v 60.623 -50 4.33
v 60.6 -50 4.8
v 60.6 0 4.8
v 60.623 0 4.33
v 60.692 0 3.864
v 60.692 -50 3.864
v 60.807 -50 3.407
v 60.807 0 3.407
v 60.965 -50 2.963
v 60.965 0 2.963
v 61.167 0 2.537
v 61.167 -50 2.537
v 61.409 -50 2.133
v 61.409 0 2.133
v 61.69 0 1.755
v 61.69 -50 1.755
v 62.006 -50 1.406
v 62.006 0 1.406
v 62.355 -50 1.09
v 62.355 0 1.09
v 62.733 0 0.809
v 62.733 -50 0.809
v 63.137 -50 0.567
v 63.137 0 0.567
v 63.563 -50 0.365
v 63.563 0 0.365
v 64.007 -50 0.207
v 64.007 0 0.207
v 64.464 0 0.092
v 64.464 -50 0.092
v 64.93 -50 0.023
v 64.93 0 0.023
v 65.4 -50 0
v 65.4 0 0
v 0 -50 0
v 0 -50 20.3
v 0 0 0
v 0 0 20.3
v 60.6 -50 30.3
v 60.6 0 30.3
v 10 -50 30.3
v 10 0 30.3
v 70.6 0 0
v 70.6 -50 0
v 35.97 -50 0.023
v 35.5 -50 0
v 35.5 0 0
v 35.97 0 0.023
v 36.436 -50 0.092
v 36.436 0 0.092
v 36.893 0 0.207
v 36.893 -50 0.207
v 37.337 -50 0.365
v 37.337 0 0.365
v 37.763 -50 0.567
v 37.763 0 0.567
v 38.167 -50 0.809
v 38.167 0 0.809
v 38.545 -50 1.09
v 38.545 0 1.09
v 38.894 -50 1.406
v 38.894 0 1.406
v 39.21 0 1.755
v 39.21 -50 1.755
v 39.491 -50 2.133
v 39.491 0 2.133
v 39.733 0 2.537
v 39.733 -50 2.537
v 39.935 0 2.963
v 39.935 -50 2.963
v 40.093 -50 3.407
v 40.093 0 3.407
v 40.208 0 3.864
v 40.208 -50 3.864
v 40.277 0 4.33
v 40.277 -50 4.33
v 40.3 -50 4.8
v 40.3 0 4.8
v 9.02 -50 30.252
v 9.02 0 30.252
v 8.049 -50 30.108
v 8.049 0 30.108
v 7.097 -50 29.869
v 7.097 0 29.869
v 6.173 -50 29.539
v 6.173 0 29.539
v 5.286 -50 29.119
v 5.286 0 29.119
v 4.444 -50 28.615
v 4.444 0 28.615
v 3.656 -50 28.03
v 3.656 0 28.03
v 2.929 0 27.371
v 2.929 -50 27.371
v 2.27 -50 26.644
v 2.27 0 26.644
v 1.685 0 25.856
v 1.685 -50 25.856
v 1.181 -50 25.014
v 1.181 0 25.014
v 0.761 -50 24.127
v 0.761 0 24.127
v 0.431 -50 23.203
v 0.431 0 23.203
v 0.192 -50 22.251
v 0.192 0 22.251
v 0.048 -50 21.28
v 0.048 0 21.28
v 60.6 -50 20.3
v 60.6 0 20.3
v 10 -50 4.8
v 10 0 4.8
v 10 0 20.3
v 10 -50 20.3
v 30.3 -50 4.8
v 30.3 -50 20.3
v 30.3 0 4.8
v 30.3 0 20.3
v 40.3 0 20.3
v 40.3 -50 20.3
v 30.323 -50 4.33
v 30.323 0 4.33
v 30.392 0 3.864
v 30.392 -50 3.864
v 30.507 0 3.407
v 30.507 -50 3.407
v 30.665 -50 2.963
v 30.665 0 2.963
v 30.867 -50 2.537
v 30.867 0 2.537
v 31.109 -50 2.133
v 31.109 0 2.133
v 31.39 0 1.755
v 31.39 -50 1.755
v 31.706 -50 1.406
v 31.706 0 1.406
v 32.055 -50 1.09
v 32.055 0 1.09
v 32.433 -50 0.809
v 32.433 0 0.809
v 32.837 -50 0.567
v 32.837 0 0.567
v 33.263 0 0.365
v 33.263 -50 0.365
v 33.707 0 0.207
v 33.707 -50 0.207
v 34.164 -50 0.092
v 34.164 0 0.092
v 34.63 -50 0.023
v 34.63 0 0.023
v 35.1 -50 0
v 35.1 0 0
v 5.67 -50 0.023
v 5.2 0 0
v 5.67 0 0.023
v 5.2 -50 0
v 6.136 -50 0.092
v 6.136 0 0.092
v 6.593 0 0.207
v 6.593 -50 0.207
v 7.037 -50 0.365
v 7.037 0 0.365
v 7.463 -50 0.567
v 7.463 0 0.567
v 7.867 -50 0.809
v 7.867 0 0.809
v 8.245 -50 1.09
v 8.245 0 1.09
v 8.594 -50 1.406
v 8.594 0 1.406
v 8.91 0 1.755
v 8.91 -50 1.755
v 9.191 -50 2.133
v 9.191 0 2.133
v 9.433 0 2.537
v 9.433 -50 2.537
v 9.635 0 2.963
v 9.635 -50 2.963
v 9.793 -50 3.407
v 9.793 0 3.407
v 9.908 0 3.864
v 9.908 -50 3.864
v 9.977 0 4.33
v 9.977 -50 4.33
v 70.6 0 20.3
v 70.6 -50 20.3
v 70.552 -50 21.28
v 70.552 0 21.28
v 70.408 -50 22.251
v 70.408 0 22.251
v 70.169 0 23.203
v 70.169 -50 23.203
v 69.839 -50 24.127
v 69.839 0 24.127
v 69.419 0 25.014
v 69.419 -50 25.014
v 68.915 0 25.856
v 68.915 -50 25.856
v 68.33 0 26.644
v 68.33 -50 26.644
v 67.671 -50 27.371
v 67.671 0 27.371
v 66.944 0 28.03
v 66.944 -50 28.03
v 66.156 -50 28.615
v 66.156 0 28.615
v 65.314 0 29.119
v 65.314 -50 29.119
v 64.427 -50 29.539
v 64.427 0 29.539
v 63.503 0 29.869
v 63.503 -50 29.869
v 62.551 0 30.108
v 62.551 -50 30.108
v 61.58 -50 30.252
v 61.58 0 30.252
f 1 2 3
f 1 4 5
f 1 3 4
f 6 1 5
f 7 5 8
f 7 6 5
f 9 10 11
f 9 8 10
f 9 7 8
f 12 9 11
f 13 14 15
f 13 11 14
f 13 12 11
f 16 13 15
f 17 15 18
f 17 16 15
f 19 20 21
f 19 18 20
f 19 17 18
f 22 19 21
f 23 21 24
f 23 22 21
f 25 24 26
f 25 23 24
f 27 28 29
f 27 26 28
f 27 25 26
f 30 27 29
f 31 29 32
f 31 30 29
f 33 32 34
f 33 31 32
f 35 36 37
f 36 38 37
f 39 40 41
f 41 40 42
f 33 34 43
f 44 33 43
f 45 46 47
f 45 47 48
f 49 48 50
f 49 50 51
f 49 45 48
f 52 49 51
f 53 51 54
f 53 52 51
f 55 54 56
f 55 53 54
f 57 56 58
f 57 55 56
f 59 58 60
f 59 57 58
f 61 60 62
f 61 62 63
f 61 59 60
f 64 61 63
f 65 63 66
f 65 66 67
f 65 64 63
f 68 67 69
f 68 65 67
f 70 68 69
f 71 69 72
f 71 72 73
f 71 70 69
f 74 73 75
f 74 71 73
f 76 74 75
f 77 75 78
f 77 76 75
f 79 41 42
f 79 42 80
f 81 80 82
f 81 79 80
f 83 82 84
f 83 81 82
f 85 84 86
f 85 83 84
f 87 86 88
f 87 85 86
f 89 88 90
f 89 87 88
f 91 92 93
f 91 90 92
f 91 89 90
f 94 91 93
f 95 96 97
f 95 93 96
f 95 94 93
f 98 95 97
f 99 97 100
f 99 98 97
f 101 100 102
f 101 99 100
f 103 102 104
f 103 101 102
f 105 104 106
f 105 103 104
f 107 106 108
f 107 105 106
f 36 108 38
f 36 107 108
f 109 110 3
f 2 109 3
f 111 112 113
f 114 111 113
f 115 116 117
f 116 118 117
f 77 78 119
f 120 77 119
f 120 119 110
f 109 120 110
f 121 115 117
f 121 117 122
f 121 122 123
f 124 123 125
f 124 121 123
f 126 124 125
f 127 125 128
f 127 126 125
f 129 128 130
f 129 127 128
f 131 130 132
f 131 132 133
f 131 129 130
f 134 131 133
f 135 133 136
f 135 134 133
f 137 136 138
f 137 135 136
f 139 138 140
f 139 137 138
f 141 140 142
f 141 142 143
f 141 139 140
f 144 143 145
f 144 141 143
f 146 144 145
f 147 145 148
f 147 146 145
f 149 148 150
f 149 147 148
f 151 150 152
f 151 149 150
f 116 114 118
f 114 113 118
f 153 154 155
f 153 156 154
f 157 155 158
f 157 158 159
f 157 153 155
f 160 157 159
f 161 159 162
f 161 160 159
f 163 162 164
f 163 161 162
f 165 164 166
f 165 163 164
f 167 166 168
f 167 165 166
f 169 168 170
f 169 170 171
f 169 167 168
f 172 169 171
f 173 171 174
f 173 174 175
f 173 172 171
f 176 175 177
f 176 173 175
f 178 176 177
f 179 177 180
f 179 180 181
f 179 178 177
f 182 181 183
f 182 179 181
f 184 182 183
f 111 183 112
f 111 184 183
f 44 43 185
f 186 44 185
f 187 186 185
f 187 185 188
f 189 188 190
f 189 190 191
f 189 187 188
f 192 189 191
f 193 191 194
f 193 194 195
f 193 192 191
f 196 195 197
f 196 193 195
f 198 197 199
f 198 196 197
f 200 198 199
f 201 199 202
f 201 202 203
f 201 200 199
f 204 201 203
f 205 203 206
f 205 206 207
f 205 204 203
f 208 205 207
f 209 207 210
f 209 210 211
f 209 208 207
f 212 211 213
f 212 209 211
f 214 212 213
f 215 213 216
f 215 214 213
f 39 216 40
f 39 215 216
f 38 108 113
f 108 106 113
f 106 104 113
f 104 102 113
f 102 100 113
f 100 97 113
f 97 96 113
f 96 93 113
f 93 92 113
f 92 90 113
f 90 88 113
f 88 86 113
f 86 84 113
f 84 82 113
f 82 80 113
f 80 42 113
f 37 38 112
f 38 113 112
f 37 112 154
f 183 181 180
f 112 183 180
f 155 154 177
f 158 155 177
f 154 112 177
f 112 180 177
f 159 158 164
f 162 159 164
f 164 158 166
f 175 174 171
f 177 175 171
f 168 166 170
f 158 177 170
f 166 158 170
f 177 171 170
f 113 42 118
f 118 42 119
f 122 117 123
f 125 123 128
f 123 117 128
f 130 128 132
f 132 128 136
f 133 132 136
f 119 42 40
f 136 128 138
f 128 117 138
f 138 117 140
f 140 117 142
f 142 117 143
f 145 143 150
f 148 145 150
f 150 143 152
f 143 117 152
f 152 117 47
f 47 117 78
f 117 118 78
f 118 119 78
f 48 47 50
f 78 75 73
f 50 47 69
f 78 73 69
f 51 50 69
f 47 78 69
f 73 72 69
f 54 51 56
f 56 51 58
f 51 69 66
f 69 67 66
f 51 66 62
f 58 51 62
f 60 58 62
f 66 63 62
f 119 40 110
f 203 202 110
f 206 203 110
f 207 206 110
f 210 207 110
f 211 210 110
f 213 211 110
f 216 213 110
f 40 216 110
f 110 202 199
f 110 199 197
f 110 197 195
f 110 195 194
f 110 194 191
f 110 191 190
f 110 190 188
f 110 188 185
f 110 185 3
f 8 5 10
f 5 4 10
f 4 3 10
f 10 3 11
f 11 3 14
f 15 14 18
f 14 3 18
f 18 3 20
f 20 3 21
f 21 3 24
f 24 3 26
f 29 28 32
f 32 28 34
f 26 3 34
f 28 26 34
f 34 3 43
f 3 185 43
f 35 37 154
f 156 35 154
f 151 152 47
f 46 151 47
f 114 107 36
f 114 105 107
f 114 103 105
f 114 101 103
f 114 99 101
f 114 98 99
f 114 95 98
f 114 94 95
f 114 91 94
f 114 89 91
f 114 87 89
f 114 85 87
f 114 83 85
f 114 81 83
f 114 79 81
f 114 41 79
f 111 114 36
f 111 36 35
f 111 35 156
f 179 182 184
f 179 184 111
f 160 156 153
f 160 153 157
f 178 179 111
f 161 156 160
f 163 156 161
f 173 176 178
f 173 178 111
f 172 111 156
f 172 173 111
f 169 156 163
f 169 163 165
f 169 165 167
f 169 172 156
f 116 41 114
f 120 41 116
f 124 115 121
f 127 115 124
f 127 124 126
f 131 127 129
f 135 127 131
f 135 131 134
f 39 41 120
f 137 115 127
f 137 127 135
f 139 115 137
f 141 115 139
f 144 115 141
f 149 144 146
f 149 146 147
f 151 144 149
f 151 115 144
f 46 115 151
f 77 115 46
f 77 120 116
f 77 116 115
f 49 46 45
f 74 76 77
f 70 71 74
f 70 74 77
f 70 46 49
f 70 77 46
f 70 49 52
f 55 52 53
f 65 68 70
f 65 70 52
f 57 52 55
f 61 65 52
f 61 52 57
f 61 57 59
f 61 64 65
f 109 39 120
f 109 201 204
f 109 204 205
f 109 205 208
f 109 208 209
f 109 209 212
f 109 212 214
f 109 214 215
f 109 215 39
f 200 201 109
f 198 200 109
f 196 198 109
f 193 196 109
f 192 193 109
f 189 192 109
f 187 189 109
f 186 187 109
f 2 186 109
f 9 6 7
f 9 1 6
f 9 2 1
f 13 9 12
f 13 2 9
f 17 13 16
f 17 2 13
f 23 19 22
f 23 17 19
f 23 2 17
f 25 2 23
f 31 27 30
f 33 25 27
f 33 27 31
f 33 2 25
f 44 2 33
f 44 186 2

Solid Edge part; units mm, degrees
sketch "Sketch1" plane through (0, 0, 0) normal (0, -1, 0) x (1, 0, 0)
  line L0 (0, 30.3) -> (0, 0)
  line L1 (0, 0) -> (10, 0)
  line L2 (10, 0) -> (10, 20.3)
  line L3 (10, 20.3) -> (30.3, 20.3)
  line L4 (30.3, 20.3) -> (30.3, 0)
  line L5 (30.3, 0) -> (40.3, 0)
  line L6 (40.3, 0) -> (40.3, 20.3)
  line L7 (40.3, 20.3) -> (60.6, 20.3)
  line L8 (60.6, 20.3) -> (60.6, 0)
  line L9 (60.6, 0) -> (70.6, 0)
  line L10 (70.6, 0) -> (70.6, 30.3)
  line L11 (70.6, 30.3) -> (0, 30.3)
extrude "Protrusion1" add sketch "Sketch1" along normal blind 50
fillet "Round1" radius 10 2 edges at (0, -25, 30.3) (70.6, -25, 30.3)
fillet "Round2" radius 4.8 4 edges at (10, -25, 0) (30.3, -25, 0) (40.3, -25, 0) (60.6, -25, 0)
